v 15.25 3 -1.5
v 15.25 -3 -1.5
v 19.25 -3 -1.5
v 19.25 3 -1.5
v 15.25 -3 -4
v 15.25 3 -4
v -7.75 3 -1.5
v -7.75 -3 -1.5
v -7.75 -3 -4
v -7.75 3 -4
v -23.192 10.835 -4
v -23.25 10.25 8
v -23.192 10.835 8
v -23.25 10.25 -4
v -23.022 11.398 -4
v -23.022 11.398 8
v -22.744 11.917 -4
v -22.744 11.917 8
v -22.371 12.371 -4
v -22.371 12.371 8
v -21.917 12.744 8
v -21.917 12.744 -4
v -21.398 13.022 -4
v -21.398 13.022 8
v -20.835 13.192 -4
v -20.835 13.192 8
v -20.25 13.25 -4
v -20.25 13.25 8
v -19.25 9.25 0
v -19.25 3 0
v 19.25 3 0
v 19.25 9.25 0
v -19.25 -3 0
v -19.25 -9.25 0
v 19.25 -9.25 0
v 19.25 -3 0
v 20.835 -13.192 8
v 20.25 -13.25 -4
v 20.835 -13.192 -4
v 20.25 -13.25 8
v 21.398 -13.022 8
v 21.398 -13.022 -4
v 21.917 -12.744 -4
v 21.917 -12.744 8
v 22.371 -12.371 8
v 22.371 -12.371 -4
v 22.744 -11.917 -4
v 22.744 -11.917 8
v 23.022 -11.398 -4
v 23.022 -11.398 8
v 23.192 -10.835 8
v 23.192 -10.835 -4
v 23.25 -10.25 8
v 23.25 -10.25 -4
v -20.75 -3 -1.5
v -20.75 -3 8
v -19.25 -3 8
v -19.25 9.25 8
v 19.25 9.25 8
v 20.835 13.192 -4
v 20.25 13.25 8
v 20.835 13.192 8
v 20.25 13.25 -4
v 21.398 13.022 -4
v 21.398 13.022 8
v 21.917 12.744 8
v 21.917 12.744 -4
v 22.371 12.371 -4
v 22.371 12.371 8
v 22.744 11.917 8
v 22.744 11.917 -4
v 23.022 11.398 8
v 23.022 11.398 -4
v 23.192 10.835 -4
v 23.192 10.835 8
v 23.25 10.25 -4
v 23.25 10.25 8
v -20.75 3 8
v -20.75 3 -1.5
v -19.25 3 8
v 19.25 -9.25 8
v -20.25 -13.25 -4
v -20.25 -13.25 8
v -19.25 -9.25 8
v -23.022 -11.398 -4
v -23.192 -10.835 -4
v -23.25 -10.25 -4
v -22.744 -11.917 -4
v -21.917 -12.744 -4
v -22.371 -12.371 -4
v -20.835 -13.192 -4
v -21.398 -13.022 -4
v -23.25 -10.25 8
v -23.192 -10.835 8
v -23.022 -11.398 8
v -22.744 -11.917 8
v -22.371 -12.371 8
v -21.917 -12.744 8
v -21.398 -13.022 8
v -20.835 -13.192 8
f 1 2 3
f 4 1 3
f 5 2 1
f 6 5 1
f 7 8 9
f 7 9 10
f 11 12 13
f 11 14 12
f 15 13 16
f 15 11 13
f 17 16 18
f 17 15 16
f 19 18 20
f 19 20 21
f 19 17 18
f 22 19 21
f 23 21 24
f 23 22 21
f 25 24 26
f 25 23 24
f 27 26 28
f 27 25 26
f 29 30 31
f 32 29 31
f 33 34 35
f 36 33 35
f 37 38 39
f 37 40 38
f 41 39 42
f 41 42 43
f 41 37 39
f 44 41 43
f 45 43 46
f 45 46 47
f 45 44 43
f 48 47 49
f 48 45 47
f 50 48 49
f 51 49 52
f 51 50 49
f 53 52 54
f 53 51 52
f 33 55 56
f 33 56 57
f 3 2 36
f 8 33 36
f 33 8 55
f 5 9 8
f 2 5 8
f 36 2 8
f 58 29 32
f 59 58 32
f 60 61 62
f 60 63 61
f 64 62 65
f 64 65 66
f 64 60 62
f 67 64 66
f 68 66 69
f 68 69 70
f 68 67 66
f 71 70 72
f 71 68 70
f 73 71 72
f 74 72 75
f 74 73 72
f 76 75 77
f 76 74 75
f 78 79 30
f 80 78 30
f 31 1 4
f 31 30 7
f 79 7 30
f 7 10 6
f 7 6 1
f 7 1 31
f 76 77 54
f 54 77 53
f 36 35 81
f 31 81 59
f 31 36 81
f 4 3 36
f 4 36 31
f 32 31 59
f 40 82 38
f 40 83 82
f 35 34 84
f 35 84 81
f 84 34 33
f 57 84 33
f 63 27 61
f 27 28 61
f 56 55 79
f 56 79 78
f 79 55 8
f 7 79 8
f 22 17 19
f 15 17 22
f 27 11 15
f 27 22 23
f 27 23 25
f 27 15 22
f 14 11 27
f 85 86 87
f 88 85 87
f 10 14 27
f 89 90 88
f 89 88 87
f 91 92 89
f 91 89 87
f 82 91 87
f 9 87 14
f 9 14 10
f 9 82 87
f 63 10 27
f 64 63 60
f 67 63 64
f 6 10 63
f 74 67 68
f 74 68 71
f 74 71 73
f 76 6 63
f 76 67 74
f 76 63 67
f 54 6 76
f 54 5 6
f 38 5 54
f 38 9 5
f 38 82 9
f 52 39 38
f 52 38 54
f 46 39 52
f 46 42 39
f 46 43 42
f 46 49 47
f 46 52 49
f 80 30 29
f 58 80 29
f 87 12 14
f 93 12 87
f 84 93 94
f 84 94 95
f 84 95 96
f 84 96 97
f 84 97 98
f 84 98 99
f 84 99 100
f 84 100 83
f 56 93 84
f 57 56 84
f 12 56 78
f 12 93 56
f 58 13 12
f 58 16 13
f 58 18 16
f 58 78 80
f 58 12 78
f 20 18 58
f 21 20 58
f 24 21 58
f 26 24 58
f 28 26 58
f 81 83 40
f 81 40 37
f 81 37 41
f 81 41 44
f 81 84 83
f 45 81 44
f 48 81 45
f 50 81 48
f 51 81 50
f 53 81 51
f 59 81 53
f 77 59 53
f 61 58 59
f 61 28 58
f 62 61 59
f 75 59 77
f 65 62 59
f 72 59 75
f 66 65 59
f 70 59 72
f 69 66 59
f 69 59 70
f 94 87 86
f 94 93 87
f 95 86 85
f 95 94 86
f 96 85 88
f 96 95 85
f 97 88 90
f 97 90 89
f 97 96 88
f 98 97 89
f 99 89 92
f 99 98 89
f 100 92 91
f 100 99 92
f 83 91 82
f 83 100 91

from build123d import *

# Parameters (mm, degrees)
F0_W     = 46.5
F0_H     = 26.5
F0_W_2   = 38.5
F0_H_2   = 18.5
F1_DEPTH = 8
F2_W     = 46.5
F2_H     = 26.5
F3_DEPTH = 4
F4_W     = 40
F4_H     = 9.5
F5_DEPTH = 3
F6_W     = 23
F6_H     = 6
F7_DEPTH = 2.5
F8_R     = 3


with BuildPart() as f1:
    # F0 (on Top) → F1 (new body)
    with BuildSketch(Plane.XY):
        Rectangle(F0_W, F0_H)
        Rectangle(F0_W_2, F0_H_2, mode=Mode.SUBTRACT)
    extrude(amount=F1_DEPTH)

    # F2 (on face) → F3 (join)
    with BuildSketch(Plane(origin=(0, 0, 0), x_dir=(1, 0, 0), z_dir=(0, 0, -1))):
        Rectangle(F2_W, F2_H)
    extrude(amount=F3_DEPTH)

    # F4 (on Front) → F5 (cut, symmetric)
    with BuildSketch(Plane.XZ):
        with Locations((-0.75, 3.25)):
            Rectangle(F4_W, F4_H)
    extrude(amount=F5_DEPTH, both=True, mode=Mode.SUBTRACT)

    # F6 (on face) → F7 (cut, through all)
    with BuildSketch(Plane.XY.offset(-1.5)):
        with Locations((3.75, 0)):
            Rectangle(F6_W, F6_H)
    extrude(amount=-F7_DEPTH, mode=Mode.SUBTRACT)

    # F8
    f8_edges = [f1.edges().sort_by_distance(p)[0] for p in [
        (-23.25, -13.25, 2),
        (23.25, -13.25, 2),
        (-23.25, 13.25, 2),
        (23.25, 13.25, 2),
    ]]
    fillet(f8_edges, radius=F8_R)


solid = f1.part
